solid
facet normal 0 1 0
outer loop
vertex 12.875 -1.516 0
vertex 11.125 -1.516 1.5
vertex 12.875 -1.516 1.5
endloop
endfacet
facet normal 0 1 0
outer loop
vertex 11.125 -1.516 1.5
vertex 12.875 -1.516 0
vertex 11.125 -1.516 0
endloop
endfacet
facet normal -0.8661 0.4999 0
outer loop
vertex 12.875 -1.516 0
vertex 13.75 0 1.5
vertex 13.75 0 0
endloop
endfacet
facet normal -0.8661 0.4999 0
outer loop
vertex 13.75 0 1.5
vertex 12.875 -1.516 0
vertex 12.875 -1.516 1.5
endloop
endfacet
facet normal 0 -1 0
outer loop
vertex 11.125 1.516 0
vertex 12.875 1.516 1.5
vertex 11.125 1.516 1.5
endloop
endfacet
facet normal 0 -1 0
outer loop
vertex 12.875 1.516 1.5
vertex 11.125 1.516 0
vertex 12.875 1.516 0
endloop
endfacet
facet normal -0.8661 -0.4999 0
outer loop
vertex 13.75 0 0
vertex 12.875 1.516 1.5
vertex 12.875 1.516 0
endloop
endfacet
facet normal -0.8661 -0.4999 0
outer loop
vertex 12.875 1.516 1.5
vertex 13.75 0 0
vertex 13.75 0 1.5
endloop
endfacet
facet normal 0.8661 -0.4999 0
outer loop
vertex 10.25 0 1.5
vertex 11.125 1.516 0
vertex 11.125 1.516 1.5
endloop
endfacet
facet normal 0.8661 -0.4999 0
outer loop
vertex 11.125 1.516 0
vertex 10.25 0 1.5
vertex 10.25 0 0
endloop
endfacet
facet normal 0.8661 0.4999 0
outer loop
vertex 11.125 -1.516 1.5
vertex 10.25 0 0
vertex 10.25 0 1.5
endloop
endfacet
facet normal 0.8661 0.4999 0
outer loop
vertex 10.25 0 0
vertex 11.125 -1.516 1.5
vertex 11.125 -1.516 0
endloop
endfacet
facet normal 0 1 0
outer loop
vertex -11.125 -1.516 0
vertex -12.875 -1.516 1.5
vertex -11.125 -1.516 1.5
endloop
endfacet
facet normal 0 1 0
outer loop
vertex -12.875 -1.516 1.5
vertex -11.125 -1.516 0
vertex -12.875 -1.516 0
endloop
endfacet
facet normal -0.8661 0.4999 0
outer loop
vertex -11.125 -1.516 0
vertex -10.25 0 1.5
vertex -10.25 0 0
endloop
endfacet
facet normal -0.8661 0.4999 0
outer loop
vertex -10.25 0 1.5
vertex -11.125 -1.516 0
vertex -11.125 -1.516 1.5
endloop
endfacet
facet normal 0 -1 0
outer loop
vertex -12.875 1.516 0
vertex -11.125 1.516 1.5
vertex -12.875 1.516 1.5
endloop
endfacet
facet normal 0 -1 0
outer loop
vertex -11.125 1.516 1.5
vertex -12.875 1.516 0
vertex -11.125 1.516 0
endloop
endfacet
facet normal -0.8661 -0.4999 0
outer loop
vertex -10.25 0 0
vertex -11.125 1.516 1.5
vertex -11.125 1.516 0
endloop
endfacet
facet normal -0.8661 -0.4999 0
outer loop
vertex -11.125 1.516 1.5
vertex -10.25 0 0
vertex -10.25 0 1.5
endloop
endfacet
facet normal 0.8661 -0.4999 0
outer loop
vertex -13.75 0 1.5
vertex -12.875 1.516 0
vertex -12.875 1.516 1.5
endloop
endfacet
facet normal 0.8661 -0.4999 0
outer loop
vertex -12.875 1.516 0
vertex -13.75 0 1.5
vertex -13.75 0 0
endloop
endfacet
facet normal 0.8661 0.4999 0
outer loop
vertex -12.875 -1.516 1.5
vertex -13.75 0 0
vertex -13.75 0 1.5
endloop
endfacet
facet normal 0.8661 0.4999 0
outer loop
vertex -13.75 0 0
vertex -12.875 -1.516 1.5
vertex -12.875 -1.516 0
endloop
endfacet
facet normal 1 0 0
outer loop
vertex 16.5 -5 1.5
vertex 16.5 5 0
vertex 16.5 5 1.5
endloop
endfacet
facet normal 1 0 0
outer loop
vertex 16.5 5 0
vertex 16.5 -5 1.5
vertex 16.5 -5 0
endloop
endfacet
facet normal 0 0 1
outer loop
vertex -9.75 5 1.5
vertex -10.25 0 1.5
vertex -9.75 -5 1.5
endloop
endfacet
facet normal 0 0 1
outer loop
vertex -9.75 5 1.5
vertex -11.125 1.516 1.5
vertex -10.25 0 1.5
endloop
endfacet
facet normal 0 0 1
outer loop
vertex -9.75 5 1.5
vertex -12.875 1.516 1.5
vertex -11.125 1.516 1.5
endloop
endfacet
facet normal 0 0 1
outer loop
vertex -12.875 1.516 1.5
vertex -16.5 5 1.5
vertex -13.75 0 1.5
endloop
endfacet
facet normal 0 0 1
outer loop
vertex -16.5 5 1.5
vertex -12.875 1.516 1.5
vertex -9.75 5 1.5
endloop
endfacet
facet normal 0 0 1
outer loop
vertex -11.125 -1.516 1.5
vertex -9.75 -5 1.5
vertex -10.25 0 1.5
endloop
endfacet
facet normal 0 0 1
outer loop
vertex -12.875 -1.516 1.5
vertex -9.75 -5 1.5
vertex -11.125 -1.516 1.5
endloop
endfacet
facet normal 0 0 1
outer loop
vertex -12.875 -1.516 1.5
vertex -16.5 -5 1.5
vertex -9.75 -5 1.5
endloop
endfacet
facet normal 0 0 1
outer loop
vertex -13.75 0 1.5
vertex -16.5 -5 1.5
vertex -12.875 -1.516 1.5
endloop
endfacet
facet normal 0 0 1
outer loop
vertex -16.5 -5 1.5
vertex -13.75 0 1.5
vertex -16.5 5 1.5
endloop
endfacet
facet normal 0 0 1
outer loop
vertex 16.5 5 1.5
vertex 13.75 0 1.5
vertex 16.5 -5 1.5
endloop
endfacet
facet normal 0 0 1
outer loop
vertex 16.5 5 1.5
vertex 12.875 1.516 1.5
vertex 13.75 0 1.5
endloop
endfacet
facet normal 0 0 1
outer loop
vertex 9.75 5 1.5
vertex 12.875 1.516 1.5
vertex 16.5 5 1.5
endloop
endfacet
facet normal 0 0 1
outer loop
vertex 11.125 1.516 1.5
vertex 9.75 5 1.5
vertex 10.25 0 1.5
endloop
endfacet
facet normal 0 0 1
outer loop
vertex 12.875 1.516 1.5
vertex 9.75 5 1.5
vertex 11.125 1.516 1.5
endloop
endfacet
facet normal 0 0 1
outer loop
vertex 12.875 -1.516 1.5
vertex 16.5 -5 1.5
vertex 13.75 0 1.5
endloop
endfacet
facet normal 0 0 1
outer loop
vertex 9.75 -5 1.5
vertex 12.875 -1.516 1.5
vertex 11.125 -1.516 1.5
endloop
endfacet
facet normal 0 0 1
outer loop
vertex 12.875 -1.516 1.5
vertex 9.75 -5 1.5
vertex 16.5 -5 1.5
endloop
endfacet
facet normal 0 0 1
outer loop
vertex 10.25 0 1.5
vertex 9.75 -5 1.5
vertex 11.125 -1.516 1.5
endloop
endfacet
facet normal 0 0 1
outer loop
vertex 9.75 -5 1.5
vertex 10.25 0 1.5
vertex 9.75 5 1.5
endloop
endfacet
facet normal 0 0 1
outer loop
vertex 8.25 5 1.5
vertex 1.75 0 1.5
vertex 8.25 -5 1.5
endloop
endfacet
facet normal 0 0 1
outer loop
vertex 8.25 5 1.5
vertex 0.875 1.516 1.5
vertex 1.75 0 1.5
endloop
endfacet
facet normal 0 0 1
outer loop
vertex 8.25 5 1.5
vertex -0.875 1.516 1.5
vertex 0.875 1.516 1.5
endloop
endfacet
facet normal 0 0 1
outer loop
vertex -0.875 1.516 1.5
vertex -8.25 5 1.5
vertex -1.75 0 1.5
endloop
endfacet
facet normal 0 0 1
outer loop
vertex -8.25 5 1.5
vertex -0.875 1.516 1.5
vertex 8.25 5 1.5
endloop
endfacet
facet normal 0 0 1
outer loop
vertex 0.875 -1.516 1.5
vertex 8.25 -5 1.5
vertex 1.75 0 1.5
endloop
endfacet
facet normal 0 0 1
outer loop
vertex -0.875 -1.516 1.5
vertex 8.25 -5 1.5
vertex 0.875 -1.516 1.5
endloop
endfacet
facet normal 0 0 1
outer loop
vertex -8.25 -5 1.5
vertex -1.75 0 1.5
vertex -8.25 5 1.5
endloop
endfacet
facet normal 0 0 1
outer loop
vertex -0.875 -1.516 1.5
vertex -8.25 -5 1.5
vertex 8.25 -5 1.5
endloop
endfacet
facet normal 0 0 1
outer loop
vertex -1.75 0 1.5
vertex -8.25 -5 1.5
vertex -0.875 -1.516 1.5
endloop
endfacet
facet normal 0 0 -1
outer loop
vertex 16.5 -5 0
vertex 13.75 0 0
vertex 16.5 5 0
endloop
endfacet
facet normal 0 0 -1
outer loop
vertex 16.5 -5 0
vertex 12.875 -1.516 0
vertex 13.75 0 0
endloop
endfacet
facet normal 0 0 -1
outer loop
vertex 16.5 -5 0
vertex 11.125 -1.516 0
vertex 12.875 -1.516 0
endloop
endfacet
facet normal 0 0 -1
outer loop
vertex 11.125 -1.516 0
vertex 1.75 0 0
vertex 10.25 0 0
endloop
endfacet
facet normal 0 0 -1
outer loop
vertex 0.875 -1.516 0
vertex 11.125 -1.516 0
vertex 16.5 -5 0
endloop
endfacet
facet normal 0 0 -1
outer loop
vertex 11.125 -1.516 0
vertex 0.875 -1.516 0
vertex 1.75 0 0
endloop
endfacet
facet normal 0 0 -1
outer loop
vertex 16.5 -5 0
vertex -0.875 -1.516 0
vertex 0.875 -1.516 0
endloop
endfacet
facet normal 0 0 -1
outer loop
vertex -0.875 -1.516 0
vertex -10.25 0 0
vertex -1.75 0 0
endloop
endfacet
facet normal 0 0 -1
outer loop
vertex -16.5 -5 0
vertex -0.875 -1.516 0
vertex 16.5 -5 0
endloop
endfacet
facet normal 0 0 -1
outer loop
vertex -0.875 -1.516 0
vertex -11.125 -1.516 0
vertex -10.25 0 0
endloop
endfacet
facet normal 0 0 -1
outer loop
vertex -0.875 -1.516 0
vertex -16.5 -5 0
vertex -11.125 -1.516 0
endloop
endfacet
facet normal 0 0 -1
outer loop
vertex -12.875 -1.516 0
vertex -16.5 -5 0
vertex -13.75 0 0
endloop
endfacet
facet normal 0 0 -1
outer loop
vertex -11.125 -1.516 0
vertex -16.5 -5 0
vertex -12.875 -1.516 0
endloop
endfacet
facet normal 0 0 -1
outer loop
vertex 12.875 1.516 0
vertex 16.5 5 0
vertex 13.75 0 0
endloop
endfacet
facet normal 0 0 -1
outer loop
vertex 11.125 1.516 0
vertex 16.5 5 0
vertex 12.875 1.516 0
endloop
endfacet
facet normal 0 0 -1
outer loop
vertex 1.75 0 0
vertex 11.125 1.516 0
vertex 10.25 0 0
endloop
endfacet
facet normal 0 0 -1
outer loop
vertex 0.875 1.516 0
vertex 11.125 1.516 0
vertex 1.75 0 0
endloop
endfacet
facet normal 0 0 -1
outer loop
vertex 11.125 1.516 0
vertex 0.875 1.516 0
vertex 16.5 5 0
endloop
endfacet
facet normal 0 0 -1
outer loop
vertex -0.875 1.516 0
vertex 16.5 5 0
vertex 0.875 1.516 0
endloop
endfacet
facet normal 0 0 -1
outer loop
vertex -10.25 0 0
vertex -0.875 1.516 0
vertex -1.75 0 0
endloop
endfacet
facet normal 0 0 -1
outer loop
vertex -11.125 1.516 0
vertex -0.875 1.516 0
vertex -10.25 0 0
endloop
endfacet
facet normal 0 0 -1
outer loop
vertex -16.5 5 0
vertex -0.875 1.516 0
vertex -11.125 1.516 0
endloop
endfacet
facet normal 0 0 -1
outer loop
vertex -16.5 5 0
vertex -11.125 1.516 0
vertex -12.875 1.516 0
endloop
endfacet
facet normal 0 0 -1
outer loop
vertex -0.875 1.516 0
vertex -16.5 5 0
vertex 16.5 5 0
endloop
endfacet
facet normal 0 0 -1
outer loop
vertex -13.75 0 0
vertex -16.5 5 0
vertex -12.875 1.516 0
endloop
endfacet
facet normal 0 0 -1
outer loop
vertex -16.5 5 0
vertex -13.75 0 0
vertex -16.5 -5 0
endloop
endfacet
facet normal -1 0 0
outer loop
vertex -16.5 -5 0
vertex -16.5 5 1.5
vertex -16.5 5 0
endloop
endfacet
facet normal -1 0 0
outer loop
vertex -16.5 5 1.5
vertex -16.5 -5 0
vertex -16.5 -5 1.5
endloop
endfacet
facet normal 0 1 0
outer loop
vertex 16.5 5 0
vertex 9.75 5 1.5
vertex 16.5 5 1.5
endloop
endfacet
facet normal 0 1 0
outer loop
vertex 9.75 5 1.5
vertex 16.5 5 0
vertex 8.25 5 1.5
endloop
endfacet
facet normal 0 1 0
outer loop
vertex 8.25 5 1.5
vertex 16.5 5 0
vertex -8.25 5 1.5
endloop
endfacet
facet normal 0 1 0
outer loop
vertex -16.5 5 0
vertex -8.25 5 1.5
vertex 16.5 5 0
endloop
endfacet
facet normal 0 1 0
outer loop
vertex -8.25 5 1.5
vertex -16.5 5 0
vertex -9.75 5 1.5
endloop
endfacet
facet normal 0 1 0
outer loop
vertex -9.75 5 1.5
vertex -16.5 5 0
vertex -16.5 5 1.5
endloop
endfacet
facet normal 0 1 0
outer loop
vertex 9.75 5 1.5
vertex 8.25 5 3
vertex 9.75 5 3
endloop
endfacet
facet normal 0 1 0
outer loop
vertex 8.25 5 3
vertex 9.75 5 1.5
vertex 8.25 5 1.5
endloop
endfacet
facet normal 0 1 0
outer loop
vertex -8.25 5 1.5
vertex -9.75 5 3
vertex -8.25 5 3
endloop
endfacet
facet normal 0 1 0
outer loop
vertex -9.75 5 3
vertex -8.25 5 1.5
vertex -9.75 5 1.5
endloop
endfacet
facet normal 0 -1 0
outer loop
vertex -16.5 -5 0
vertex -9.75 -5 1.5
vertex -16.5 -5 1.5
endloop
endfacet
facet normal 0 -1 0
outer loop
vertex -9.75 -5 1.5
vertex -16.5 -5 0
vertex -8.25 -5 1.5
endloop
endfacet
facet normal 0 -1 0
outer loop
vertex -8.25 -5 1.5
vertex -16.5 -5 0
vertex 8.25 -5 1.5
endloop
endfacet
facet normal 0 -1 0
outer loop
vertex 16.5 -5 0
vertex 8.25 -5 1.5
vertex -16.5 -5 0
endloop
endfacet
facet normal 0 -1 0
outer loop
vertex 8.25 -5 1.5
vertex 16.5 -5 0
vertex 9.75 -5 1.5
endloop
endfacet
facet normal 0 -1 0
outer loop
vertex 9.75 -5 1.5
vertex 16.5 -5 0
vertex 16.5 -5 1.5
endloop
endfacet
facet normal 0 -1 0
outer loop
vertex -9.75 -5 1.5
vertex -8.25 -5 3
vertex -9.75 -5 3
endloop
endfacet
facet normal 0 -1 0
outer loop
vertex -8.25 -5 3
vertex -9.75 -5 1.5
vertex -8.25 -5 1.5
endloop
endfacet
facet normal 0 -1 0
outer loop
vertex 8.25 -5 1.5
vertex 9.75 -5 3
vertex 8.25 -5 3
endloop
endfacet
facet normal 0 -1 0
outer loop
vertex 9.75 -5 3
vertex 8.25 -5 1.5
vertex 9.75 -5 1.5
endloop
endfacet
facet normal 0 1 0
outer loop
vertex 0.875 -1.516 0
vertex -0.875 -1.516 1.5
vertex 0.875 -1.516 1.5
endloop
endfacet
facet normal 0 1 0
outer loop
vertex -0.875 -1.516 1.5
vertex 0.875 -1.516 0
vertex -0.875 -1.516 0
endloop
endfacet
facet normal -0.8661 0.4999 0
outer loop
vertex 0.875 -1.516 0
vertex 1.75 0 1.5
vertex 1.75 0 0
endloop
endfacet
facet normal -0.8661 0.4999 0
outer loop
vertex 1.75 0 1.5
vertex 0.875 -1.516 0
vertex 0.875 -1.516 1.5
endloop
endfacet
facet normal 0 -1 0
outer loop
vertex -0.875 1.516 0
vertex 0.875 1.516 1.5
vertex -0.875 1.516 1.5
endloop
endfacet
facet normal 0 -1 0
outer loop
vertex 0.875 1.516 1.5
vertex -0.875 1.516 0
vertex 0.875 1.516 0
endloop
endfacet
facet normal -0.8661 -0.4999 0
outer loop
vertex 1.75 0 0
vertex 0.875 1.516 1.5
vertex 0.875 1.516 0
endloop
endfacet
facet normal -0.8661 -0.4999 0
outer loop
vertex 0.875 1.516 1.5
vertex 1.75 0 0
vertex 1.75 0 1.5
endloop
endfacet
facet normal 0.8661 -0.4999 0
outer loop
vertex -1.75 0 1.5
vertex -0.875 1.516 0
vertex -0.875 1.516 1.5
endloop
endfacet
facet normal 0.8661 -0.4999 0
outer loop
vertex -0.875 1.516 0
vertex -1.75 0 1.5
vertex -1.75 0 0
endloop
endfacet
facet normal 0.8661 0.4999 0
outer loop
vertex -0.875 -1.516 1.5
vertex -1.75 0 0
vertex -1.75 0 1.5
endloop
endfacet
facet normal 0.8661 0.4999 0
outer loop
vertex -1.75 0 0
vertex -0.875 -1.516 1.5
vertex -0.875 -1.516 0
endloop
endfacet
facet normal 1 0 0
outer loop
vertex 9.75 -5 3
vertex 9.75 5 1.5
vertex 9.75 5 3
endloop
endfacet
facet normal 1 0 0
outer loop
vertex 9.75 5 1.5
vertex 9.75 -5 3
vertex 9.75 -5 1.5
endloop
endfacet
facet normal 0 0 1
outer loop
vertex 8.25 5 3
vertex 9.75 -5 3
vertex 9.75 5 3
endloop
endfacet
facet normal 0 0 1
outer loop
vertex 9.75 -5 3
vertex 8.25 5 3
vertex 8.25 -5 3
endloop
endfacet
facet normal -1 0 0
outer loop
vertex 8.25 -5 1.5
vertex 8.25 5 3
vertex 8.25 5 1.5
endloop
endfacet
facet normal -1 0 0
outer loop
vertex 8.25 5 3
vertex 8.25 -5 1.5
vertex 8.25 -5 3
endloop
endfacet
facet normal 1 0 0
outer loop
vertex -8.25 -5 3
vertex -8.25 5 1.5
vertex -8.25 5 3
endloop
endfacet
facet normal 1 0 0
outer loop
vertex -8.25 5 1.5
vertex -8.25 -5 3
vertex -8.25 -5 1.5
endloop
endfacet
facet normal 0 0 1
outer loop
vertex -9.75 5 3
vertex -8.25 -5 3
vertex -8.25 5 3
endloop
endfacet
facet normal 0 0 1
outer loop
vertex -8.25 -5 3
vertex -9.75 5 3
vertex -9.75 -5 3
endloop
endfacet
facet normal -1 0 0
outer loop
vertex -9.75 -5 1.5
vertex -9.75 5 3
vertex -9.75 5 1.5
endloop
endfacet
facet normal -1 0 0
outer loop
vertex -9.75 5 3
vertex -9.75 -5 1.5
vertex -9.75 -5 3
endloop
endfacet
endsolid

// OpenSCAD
union() {
	difference() {
		translate(v = [0, 0, 0.7500000000]) {
			cube(center = true, size = [33.0000000000, 10, 1.5000000000]);
		}
		translate(v = [0, 0, -1.5000000000]) {
			cylinder(d = 3.5000000000, h = 10);
		}
		union() {
			translate(v = [12.0000000000, 0, 0]) {
				translate(v = [0, 0, -1.5000000000]) {
					cylinder(d = 3.5000000000, h = 10);
				}
			}
			translate(v = [-12.0000000000, 0, 0]) {
				translate(v = [0, 0, -1.5000000000]) {
					cylinder(d = 3.5000000000, h = 10);
				}
			}
		}
	}
	translate(v = [9.0000000000, 0, 0]) {
		translate(v = [0, 0, 1.5000000000]) {
			cube(center = true, size = [1.5000000000, 10, 3.0000000000]);
		}
	}
	translate(v = [-9.0000000000, 0, 0]) {
		translate(v = [0, 0, 1.5000000000]) {
			cube(center = true, size = [1.5000000000, 10, 3.0000000000]);
		}
	}
}
